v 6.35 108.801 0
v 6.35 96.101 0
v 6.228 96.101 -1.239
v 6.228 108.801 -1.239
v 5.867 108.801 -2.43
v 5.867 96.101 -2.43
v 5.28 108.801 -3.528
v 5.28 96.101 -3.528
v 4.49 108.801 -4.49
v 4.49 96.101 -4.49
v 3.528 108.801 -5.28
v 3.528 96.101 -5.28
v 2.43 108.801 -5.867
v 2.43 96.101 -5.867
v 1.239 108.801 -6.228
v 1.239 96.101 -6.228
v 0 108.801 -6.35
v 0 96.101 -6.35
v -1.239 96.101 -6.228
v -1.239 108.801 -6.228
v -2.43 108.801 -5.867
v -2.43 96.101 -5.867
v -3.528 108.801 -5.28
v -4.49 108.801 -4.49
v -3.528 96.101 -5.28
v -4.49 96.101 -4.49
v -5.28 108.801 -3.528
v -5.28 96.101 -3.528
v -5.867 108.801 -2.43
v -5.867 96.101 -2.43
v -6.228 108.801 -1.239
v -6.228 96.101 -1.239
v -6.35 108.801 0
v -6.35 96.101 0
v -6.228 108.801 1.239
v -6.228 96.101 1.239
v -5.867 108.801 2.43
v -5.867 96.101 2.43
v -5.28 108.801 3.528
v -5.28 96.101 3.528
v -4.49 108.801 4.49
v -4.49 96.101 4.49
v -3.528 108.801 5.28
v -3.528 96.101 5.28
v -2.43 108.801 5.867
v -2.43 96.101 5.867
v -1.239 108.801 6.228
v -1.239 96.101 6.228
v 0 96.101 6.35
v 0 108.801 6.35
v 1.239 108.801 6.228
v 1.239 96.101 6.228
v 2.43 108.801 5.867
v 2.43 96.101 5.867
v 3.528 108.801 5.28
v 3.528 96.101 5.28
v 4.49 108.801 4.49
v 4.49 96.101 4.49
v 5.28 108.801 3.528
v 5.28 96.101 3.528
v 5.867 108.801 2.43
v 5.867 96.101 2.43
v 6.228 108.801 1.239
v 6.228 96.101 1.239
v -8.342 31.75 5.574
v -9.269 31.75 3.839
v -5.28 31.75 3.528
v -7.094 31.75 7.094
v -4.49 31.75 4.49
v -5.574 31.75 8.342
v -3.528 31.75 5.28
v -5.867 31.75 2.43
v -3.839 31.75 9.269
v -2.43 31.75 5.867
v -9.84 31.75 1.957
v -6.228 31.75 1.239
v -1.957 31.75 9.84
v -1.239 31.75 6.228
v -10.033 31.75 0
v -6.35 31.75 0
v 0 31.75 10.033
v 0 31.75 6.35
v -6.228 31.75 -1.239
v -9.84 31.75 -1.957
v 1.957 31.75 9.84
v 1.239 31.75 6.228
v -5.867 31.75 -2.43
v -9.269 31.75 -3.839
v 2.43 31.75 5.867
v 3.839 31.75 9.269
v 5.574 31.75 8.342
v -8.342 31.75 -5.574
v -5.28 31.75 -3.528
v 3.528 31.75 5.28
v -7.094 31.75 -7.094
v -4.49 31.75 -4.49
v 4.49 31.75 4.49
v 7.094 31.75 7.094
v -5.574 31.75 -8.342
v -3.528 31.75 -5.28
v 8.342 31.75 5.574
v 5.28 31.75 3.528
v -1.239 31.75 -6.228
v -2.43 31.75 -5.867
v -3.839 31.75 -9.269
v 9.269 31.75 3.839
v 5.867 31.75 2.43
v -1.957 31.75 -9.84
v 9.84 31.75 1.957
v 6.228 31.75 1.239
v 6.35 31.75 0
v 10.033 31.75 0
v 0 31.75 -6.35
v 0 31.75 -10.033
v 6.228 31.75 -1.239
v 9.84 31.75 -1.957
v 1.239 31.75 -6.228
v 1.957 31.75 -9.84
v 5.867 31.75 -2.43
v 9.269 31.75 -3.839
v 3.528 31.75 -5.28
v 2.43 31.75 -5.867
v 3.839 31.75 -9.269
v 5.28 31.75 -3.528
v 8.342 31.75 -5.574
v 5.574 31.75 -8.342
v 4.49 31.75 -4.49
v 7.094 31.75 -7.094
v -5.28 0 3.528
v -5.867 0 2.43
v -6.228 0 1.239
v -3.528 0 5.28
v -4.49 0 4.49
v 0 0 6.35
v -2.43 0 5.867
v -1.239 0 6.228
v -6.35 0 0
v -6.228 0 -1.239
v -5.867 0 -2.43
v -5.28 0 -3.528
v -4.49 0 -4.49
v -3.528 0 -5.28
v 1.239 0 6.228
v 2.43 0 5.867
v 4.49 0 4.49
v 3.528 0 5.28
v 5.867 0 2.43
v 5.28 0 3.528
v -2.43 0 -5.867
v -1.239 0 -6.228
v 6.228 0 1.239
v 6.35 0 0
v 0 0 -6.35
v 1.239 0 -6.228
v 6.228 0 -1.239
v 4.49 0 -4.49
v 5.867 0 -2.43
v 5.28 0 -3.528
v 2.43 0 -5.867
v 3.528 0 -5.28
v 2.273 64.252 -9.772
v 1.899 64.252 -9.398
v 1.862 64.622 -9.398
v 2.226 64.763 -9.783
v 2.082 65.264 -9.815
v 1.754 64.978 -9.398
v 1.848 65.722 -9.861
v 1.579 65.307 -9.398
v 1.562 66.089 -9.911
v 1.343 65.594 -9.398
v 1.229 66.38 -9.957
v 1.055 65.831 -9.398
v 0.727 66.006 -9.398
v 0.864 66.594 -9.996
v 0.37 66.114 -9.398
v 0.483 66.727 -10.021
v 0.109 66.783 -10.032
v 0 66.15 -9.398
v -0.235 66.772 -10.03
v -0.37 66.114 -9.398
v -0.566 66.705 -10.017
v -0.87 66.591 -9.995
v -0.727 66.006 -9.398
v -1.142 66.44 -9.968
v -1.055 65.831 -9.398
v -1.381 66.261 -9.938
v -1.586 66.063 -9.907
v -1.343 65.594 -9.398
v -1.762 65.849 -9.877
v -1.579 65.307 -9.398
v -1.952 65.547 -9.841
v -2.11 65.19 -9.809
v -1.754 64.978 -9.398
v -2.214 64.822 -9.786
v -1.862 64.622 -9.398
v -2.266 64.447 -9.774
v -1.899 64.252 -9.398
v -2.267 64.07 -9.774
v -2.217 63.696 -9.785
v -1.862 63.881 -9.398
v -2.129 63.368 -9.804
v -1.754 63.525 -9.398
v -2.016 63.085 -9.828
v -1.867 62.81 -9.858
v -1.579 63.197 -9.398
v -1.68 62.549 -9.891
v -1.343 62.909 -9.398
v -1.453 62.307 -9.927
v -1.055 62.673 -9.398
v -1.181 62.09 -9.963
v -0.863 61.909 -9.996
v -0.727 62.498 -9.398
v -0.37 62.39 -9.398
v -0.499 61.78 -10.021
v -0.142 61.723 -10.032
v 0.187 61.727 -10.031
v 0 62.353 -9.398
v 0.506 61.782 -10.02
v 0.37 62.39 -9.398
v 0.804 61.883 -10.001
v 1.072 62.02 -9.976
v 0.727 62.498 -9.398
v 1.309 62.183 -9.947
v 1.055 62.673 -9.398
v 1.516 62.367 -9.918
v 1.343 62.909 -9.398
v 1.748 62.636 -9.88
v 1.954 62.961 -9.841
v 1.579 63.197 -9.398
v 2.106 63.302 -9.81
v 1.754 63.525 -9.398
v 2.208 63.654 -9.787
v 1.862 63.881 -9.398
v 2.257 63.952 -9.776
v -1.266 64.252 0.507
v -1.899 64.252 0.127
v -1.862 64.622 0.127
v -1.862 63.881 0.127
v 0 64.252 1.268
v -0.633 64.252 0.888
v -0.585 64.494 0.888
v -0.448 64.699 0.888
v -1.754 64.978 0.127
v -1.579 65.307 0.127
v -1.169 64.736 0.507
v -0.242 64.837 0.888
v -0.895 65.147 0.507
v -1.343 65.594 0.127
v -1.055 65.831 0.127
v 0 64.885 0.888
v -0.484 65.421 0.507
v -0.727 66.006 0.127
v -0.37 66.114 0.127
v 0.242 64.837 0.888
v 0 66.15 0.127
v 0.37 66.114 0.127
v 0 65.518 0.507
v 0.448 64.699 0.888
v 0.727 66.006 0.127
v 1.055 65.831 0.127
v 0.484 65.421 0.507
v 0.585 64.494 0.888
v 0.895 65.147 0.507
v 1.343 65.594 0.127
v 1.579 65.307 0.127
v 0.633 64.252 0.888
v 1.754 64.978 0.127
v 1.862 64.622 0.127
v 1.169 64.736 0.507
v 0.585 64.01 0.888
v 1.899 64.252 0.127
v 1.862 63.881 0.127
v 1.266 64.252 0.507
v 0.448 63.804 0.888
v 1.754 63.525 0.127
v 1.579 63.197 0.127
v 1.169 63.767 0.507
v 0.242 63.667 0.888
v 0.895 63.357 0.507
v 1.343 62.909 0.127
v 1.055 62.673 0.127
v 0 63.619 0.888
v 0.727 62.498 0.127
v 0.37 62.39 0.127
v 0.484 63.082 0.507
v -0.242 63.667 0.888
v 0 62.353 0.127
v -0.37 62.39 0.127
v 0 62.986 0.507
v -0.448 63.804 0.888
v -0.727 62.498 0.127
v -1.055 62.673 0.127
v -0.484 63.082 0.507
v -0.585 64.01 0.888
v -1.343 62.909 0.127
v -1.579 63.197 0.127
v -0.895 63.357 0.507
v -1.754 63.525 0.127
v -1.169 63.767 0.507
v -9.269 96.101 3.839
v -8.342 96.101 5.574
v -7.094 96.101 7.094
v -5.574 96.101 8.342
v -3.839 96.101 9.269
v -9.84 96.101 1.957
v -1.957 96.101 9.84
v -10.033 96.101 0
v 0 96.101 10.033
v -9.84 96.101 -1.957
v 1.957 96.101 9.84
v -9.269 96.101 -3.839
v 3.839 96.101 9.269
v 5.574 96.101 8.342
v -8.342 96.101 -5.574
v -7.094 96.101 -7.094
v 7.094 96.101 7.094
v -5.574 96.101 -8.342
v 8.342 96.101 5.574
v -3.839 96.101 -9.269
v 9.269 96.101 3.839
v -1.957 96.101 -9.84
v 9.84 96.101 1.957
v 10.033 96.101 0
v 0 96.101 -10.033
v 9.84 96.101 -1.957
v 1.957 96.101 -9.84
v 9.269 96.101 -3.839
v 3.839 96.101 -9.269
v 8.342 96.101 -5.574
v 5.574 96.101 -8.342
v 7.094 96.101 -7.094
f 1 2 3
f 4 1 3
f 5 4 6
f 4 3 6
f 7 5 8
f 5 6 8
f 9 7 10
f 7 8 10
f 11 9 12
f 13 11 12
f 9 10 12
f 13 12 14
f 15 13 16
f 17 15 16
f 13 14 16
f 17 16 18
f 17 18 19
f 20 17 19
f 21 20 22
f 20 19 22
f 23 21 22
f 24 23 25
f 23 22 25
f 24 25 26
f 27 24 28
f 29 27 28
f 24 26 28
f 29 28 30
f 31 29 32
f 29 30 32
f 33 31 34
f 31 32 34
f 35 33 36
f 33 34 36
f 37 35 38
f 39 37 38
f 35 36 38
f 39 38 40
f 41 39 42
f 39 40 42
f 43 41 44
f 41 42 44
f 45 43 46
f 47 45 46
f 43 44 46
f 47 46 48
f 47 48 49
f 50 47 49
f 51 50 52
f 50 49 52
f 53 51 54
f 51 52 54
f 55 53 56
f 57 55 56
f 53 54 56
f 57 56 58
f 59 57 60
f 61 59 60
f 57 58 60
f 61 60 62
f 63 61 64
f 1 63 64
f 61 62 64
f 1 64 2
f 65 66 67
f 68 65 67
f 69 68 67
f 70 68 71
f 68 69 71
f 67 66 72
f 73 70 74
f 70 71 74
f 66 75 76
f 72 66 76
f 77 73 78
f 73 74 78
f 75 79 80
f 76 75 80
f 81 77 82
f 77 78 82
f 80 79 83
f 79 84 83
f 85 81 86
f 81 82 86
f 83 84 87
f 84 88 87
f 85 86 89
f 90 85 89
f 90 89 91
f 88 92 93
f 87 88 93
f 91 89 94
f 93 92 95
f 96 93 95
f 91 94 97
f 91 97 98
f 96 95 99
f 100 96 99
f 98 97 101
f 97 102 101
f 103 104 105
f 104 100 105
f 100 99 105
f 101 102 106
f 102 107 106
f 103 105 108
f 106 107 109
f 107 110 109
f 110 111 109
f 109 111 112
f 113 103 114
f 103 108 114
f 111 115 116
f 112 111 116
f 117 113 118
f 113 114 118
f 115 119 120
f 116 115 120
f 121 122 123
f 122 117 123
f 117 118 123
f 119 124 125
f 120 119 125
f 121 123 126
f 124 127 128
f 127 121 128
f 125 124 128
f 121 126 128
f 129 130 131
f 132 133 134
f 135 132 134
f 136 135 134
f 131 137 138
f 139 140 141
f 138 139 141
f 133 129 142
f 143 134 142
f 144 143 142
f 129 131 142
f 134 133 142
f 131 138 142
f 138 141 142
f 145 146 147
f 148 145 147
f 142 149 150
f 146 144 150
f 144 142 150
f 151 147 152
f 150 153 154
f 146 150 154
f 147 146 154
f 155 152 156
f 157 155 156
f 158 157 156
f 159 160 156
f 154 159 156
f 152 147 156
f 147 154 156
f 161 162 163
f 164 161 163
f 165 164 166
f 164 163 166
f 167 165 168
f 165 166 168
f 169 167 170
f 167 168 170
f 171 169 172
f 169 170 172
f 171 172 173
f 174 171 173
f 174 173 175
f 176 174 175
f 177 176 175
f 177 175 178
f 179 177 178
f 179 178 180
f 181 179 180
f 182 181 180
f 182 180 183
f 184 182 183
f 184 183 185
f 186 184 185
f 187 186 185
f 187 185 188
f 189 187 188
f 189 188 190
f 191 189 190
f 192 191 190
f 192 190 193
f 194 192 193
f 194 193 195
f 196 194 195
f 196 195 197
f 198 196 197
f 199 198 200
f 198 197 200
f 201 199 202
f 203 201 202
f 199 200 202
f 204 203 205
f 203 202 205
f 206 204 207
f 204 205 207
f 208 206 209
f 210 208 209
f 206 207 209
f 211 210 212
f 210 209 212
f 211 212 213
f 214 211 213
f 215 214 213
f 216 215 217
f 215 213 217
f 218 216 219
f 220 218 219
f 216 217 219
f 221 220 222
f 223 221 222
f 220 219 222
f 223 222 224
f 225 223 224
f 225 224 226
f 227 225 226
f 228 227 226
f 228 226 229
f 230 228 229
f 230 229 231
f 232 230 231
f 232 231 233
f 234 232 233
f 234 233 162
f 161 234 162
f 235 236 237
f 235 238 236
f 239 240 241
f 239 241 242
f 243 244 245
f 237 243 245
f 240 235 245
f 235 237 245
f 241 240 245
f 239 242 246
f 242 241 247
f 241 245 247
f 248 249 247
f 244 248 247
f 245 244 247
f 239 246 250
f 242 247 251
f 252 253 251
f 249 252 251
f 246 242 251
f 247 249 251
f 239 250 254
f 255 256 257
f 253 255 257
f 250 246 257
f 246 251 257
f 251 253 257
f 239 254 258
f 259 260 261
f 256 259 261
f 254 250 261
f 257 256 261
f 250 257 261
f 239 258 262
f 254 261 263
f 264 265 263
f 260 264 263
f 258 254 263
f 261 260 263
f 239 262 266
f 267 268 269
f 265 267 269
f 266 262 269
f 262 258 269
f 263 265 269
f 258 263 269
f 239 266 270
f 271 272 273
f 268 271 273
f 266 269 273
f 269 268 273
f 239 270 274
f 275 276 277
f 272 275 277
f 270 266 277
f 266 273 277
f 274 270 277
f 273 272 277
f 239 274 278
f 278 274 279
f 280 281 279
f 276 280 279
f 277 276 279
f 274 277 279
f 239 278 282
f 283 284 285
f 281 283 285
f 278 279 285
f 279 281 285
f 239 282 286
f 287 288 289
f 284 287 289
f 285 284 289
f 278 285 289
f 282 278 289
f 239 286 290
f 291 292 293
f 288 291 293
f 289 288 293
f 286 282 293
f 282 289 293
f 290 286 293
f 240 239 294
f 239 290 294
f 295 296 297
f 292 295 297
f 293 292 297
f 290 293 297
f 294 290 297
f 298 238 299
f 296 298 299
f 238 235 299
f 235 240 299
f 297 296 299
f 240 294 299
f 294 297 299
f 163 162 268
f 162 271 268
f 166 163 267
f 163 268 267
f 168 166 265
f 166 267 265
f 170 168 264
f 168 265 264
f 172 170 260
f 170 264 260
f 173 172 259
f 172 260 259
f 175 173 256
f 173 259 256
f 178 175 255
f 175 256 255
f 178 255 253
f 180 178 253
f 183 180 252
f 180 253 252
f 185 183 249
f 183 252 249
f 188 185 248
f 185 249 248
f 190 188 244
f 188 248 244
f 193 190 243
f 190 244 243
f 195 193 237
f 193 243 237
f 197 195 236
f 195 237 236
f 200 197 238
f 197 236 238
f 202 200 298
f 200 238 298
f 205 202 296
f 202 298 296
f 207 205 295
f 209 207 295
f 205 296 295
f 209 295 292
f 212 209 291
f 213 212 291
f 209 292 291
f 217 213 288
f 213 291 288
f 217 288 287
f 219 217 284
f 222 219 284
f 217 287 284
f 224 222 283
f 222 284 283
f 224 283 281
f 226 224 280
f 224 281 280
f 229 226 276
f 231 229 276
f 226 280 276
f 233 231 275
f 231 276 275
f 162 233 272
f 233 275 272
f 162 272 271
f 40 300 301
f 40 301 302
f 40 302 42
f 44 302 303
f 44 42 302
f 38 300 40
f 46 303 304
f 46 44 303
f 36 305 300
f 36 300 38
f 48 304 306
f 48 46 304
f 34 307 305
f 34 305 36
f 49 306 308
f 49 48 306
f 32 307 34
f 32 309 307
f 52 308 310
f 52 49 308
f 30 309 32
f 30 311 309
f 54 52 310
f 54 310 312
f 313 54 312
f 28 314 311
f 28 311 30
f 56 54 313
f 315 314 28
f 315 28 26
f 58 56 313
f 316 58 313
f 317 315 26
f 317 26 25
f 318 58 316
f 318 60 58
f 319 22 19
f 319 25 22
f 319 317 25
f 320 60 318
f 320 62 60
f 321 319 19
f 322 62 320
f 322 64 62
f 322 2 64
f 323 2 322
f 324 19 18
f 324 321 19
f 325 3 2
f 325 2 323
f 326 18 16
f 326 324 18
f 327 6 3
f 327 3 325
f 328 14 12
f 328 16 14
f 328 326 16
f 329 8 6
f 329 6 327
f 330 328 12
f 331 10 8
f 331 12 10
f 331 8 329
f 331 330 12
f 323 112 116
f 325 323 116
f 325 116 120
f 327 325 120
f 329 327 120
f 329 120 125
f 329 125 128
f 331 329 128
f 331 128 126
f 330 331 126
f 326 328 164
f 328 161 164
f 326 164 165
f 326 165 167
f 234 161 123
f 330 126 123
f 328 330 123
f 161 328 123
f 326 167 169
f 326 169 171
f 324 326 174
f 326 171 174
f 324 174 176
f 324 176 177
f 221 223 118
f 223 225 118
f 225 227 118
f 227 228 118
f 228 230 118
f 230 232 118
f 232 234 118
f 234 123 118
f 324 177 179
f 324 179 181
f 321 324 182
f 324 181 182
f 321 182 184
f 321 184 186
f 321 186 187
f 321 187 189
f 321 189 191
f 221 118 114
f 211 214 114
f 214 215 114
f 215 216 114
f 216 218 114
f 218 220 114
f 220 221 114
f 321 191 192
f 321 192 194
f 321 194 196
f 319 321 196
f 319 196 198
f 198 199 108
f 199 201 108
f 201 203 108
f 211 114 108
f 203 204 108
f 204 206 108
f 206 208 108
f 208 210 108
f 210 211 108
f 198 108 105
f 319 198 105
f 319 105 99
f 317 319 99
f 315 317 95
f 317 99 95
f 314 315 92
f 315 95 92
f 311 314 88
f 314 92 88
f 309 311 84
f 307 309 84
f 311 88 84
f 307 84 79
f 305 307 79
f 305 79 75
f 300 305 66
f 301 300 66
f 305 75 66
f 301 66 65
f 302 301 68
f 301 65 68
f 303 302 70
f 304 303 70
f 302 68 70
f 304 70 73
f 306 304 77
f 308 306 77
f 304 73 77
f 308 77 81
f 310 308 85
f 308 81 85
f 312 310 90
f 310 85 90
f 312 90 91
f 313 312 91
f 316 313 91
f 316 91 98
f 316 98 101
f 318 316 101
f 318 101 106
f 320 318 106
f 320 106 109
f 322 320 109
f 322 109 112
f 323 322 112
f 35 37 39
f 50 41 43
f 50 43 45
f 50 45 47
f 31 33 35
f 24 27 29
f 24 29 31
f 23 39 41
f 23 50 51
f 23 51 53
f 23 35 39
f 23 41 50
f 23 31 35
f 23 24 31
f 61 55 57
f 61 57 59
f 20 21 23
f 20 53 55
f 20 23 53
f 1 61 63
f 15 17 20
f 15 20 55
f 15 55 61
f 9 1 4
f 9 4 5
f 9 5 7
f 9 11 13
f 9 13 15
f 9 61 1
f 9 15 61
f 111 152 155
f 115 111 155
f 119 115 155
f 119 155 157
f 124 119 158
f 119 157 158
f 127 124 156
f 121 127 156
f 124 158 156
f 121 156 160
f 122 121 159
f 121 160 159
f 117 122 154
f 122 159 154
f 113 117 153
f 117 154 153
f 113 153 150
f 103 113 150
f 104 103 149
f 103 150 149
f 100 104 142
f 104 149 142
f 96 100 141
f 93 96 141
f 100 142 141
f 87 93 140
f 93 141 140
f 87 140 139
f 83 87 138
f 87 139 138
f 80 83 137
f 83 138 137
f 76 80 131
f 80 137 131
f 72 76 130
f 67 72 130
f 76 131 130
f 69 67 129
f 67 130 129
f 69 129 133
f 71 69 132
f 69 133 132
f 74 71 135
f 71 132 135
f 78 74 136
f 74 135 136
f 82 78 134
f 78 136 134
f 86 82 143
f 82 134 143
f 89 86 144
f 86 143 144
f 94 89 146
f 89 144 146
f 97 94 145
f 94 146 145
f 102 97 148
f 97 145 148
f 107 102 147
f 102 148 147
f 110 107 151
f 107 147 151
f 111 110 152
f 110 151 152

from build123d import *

# Parameters (mm, degrees)
SKETCH1_R                        = 6.35
BUSHINGSPROCKETSPACE_DEPTH       = 31.75
SKETCH2_R                        = 10.033
BOSS_EXTRUDE2_DEPTH              = 64.3509
SKETCH3_R                        = 6.35
BOSS_EXTRUDE3_DEPTH              = 12.7
F_10_24_TAPPED_HOLE2_D           = 3.7973
F_10_24_TAPPED_HOLE2_DEPTH       = 10.16
F_10_24_TAPPED_HOLE2_CSINK_D     = 5.0673
F_10_24_TAPPED_HOLE2_CSINK_ANGLE = 90
F_10_24_TAPPED_HOLE2_TIP         = 1.140824014


with BuildPart() as part:
    # Sketch1 → BushingSprocketSpace (new body)
    with BuildSketch(Plane(origin=(0, 0, 0), x_dir=(1, 0, 0), z_dir=(0, 1, 0))):
        Circle(SKETCH1_R)
    extrude(amount=BUSHINGSPROCKETSPACE_DEPTH)

    # Sketch2 → Boss-Extrude2 (add)
    with BuildSketch(Plane(origin=(0, 31.75, 0), x_dir=(1, 0, 0), z_dir=(0, 1, 0))):
        Circle(SKETCH2_R)
    extrude(amount=BOSS_EXTRUDE2_DEPTH)

    # Sketch3 → Boss-Extrude3 (add)
    with BuildSketch(Plane(origin=(0, 96.1009, 0), x_dir=(1, 0, 0), z_dir=(0, 1, 0))):
        Circle(SKETCH3_R)
    extrude(amount=BOSS_EXTRUDE3_DEPTH)

    # #10-24 Tapped Hole2
    with Locations(Plane(origin=(0, 64.25184, -10.033), x_dir=(-1, 0, 0), z_dir=(0, 0, -1))):
        with Locations((0, 0)):
            CounterSinkHole(F_10_24_TAPPED_HOLE2_D / 2, F_10_24_TAPPED_HOLE2_CSINK_D / 2, depth=F_10_24_TAPPED_HOLE2_DEPTH, counter_sink_angle=F_10_24_TAPPED_HOLE2_CSINK_ANGLE)
            with Locations((0, 0, -(F_10_24_TAPPED_HOLE2_DEPTH + F_10_24_TAPPED_HOLE2_TIP / 2))):  # 118° drill point
                Cone(0, F_10_24_TAPPED_HOLE2_D / 2, F_10_24_TAPPED_HOLE2_TIP, mode=Mode.SUBTRACT)


solid = part.part
